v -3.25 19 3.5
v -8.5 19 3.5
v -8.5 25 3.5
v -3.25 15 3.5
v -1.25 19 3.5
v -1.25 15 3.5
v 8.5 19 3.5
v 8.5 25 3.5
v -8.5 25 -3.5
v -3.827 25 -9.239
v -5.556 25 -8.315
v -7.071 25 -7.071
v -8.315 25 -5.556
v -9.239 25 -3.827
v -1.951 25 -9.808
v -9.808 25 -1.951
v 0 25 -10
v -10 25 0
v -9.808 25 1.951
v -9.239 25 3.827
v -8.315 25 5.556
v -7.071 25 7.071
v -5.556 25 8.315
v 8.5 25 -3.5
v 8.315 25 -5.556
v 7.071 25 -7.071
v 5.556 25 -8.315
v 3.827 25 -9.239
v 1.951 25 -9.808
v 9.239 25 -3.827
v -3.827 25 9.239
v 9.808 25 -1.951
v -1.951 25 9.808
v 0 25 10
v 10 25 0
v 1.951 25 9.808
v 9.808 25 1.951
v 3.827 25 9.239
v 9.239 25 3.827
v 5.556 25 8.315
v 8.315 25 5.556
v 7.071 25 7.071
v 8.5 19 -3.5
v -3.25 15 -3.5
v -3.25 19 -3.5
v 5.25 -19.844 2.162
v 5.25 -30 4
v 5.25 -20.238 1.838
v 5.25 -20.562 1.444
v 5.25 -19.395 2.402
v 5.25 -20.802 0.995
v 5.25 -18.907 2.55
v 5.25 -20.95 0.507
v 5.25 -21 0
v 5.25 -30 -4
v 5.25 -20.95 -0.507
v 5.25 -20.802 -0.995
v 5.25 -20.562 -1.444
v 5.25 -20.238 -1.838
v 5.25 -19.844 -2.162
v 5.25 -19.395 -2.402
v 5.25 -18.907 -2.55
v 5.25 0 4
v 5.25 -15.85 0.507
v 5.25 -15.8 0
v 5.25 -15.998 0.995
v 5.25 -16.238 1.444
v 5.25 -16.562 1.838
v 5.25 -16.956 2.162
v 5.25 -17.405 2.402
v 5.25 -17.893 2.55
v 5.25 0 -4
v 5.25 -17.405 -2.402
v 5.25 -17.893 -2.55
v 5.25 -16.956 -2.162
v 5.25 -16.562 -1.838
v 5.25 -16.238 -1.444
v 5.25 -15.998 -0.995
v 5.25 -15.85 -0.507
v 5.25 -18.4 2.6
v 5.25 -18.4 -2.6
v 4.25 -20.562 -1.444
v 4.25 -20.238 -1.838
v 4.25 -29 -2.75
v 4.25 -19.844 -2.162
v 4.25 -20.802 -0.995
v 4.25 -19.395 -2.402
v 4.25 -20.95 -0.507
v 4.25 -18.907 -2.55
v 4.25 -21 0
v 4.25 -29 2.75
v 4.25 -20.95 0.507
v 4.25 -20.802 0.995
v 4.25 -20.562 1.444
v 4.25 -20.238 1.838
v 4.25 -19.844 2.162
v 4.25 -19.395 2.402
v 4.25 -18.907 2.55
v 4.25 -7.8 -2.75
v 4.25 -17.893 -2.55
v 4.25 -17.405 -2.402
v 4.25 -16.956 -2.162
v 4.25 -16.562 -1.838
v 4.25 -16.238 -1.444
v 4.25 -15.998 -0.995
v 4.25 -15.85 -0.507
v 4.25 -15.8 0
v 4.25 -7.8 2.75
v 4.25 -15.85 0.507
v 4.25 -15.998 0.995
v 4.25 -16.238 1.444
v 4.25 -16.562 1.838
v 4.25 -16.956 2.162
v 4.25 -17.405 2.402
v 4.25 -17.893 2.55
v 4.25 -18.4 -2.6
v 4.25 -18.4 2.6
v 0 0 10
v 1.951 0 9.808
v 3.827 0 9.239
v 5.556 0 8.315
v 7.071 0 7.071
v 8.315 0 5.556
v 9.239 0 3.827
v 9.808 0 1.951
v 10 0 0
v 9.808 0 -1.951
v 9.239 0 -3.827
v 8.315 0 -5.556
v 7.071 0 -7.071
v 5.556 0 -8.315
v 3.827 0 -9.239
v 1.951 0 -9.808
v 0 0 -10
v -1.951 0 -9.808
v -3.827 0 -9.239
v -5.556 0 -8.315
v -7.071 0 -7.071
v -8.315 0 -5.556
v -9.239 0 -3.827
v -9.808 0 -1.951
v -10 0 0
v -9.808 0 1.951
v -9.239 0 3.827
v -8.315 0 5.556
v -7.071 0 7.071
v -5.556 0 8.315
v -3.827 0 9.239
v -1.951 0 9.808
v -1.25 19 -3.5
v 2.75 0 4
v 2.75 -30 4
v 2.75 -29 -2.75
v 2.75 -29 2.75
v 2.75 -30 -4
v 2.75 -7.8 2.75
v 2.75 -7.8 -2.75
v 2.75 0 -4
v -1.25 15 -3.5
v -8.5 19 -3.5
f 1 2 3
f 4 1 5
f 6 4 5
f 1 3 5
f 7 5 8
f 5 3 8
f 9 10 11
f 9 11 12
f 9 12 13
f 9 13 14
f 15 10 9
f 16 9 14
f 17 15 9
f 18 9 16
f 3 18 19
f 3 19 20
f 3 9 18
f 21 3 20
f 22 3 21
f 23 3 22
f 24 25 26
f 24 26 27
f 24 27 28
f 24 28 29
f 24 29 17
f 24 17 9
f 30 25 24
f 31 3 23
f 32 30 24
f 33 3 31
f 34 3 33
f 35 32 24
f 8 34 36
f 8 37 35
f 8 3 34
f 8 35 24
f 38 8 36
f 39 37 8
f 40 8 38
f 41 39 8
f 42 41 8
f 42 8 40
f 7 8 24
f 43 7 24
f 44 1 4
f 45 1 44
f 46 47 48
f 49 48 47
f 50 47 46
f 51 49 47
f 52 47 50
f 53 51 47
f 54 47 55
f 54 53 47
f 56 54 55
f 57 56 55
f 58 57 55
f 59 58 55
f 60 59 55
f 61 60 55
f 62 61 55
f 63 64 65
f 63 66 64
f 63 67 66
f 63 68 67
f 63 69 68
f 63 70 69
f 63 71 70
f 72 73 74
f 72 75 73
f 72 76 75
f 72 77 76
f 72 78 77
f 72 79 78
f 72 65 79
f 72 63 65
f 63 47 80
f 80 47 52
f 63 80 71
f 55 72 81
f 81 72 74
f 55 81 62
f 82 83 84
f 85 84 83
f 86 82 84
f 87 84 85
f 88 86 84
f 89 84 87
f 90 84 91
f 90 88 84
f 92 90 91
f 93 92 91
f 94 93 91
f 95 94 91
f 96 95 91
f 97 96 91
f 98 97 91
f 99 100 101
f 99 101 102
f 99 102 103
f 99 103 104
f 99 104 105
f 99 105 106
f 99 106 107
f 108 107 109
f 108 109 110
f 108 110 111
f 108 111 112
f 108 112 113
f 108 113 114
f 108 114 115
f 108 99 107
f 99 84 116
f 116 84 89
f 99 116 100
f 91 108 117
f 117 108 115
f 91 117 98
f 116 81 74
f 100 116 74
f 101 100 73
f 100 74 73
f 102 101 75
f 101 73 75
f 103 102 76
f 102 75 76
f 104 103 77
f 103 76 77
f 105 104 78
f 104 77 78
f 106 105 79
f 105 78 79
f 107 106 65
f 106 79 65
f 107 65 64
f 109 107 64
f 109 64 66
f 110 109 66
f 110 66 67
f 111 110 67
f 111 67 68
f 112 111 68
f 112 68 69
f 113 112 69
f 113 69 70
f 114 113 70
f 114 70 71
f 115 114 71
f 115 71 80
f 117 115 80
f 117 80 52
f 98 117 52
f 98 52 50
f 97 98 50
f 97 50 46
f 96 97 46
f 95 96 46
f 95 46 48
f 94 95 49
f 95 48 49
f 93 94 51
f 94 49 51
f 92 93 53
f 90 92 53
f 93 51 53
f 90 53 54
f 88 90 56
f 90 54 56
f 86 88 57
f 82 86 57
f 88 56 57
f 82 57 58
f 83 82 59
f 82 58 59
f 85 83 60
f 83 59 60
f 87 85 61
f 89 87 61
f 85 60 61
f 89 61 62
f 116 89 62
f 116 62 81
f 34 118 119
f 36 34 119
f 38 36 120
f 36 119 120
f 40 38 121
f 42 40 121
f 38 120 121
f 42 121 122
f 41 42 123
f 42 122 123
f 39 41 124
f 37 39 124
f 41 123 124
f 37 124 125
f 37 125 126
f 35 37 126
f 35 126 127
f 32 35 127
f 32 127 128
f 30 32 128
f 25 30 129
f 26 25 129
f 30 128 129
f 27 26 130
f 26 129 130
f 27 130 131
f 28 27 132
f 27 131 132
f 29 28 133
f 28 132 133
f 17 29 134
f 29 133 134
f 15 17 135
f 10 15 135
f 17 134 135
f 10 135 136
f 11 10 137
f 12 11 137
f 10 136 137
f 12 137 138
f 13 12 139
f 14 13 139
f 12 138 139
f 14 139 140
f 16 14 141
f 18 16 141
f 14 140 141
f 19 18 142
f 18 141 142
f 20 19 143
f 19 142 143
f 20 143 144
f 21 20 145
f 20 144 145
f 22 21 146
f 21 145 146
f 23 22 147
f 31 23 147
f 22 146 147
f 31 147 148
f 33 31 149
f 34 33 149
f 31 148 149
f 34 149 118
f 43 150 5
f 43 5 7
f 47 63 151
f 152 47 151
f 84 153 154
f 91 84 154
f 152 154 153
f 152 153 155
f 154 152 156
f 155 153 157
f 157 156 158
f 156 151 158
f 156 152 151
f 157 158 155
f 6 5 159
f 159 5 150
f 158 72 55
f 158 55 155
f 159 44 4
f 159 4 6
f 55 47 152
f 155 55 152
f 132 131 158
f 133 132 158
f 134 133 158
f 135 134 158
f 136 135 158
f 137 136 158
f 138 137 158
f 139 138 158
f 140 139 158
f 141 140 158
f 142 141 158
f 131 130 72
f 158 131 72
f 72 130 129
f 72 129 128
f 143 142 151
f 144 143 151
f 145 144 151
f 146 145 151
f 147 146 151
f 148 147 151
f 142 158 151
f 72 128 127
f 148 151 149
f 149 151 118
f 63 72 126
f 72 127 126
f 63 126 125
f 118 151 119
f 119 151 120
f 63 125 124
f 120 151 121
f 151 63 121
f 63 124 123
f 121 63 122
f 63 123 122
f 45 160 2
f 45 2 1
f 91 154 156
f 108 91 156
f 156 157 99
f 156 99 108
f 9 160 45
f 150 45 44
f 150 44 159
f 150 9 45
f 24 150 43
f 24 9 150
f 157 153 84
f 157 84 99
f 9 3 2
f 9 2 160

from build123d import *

# Parameters (mm, degrees)
SKETCH3_R           = 10
BOSS_EXTRUDE1_DEPTH = 25
SKETCH4_W           = 2.5
SKETCH4_H           = 8
BOSS_EXTRUDE2_DEPTH = 30
CUT_EXTRUDE1_REACH  = 37.108
SKETCH5_R           = 2.6
SKETCH6_W           = 5.5
SKETCH6_H           = 21.2
CUT_EXTRUDE2_DEPTH  = 1.5
SKETCH7_W           = 17
SKETCH7_H           = 7
CUT_EXTRUDE3_DEPTH  = 6
SKETCH8_W           = 2
SKETCH8_H           = 7
CUT_EXTRUDE4_DEPTH  = 4


with BuildPart() as part:
    # Sketch3 → Boss-Extrude1 (new body)
    with BuildSketch(Plane(origin=(0, 0, 0), x_dir=(1, 0, 0), z_dir=(0, 1, 0))):
        with Locations(Location((0, 0, 0), (0, 0, 270))):
            Circle(SKETCH3_R)
    extrude(amount=BOSS_EXTRUDE1_DEPTH)

    # Sketch4 → Boss-Extrude2 (add)
    with BuildSketch(Plane(origin=(0, 0, 0), x_dir=(-1, 0, 0), z_dir=(0, -1, 0))):
        with Locations((-4, 0)):
            Rectangle(SKETCH4_W, SKETCH4_H)
    extrude(amount=BOSS_EXTRUDE2_DEPTH)

    # Sketch5 → Cut-Extrude1 (cut, up to next)
    with BuildSketch(Plane(origin=(5.25, 0, 0), x_dir=(0, 0, -1), z_dir=(1, 0, 0)), mode=Mode.PRIVATE) as cut_extrude1_sk1:
        with Locations((0, -18.4)):
            Circle(SKETCH5_R)
    cut_extrude1_tool1 = extrude(cut_extrude1_sk1.sketch, amount=-CUT_EXTRUDE1_REACH, mode=Mode.PRIVATE) & part.part
    add(cut_extrude1_tool1.solids().sort_by_distance((5.25, -18.4, 0))[0], mode=Mode.SUBTRACT)

    # Sketch6 → Cut-Extrude2 (cut)
    with BuildSketch(Plane.ZY.offset(-2.75)):
        with Locations((0, -18.4)):
            Rectangle(SKETCH6_W, SKETCH6_H)
    extrude(amount=-CUT_EXTRUDE2_DEPTH, mode=Mode.SUBTRACT)

    # Sketch7 → Cut-Extrude3 (cut)
    with BuildSketch(Plane(origin=(0, 25, 0), x_dir=(1, 0, 0), z_dir=(0, 1, 0))):
        Rectangle(SKETCH7_W, SKETCH7_H)
    extrude(amount=-CUT_EXTRUDE3_DEPTH, mode=Mode.SUBTRACT)

    # Sketch8 → Cut-Extrude4 (cut)
    with BuildSketch(Plane(origin=(0, 19, 0), x_dir=(1, 0, 0), z_dir=(0, 1, 0))):
        with Locations((-2.25, 0)):
            Rectangle(SKETCH8_W, SKETCH8_H)
    extrude(amount=-CUT_EXTRUDE4_DEPTH, mode=Mode.SUBTRACT)


solid = part.part
